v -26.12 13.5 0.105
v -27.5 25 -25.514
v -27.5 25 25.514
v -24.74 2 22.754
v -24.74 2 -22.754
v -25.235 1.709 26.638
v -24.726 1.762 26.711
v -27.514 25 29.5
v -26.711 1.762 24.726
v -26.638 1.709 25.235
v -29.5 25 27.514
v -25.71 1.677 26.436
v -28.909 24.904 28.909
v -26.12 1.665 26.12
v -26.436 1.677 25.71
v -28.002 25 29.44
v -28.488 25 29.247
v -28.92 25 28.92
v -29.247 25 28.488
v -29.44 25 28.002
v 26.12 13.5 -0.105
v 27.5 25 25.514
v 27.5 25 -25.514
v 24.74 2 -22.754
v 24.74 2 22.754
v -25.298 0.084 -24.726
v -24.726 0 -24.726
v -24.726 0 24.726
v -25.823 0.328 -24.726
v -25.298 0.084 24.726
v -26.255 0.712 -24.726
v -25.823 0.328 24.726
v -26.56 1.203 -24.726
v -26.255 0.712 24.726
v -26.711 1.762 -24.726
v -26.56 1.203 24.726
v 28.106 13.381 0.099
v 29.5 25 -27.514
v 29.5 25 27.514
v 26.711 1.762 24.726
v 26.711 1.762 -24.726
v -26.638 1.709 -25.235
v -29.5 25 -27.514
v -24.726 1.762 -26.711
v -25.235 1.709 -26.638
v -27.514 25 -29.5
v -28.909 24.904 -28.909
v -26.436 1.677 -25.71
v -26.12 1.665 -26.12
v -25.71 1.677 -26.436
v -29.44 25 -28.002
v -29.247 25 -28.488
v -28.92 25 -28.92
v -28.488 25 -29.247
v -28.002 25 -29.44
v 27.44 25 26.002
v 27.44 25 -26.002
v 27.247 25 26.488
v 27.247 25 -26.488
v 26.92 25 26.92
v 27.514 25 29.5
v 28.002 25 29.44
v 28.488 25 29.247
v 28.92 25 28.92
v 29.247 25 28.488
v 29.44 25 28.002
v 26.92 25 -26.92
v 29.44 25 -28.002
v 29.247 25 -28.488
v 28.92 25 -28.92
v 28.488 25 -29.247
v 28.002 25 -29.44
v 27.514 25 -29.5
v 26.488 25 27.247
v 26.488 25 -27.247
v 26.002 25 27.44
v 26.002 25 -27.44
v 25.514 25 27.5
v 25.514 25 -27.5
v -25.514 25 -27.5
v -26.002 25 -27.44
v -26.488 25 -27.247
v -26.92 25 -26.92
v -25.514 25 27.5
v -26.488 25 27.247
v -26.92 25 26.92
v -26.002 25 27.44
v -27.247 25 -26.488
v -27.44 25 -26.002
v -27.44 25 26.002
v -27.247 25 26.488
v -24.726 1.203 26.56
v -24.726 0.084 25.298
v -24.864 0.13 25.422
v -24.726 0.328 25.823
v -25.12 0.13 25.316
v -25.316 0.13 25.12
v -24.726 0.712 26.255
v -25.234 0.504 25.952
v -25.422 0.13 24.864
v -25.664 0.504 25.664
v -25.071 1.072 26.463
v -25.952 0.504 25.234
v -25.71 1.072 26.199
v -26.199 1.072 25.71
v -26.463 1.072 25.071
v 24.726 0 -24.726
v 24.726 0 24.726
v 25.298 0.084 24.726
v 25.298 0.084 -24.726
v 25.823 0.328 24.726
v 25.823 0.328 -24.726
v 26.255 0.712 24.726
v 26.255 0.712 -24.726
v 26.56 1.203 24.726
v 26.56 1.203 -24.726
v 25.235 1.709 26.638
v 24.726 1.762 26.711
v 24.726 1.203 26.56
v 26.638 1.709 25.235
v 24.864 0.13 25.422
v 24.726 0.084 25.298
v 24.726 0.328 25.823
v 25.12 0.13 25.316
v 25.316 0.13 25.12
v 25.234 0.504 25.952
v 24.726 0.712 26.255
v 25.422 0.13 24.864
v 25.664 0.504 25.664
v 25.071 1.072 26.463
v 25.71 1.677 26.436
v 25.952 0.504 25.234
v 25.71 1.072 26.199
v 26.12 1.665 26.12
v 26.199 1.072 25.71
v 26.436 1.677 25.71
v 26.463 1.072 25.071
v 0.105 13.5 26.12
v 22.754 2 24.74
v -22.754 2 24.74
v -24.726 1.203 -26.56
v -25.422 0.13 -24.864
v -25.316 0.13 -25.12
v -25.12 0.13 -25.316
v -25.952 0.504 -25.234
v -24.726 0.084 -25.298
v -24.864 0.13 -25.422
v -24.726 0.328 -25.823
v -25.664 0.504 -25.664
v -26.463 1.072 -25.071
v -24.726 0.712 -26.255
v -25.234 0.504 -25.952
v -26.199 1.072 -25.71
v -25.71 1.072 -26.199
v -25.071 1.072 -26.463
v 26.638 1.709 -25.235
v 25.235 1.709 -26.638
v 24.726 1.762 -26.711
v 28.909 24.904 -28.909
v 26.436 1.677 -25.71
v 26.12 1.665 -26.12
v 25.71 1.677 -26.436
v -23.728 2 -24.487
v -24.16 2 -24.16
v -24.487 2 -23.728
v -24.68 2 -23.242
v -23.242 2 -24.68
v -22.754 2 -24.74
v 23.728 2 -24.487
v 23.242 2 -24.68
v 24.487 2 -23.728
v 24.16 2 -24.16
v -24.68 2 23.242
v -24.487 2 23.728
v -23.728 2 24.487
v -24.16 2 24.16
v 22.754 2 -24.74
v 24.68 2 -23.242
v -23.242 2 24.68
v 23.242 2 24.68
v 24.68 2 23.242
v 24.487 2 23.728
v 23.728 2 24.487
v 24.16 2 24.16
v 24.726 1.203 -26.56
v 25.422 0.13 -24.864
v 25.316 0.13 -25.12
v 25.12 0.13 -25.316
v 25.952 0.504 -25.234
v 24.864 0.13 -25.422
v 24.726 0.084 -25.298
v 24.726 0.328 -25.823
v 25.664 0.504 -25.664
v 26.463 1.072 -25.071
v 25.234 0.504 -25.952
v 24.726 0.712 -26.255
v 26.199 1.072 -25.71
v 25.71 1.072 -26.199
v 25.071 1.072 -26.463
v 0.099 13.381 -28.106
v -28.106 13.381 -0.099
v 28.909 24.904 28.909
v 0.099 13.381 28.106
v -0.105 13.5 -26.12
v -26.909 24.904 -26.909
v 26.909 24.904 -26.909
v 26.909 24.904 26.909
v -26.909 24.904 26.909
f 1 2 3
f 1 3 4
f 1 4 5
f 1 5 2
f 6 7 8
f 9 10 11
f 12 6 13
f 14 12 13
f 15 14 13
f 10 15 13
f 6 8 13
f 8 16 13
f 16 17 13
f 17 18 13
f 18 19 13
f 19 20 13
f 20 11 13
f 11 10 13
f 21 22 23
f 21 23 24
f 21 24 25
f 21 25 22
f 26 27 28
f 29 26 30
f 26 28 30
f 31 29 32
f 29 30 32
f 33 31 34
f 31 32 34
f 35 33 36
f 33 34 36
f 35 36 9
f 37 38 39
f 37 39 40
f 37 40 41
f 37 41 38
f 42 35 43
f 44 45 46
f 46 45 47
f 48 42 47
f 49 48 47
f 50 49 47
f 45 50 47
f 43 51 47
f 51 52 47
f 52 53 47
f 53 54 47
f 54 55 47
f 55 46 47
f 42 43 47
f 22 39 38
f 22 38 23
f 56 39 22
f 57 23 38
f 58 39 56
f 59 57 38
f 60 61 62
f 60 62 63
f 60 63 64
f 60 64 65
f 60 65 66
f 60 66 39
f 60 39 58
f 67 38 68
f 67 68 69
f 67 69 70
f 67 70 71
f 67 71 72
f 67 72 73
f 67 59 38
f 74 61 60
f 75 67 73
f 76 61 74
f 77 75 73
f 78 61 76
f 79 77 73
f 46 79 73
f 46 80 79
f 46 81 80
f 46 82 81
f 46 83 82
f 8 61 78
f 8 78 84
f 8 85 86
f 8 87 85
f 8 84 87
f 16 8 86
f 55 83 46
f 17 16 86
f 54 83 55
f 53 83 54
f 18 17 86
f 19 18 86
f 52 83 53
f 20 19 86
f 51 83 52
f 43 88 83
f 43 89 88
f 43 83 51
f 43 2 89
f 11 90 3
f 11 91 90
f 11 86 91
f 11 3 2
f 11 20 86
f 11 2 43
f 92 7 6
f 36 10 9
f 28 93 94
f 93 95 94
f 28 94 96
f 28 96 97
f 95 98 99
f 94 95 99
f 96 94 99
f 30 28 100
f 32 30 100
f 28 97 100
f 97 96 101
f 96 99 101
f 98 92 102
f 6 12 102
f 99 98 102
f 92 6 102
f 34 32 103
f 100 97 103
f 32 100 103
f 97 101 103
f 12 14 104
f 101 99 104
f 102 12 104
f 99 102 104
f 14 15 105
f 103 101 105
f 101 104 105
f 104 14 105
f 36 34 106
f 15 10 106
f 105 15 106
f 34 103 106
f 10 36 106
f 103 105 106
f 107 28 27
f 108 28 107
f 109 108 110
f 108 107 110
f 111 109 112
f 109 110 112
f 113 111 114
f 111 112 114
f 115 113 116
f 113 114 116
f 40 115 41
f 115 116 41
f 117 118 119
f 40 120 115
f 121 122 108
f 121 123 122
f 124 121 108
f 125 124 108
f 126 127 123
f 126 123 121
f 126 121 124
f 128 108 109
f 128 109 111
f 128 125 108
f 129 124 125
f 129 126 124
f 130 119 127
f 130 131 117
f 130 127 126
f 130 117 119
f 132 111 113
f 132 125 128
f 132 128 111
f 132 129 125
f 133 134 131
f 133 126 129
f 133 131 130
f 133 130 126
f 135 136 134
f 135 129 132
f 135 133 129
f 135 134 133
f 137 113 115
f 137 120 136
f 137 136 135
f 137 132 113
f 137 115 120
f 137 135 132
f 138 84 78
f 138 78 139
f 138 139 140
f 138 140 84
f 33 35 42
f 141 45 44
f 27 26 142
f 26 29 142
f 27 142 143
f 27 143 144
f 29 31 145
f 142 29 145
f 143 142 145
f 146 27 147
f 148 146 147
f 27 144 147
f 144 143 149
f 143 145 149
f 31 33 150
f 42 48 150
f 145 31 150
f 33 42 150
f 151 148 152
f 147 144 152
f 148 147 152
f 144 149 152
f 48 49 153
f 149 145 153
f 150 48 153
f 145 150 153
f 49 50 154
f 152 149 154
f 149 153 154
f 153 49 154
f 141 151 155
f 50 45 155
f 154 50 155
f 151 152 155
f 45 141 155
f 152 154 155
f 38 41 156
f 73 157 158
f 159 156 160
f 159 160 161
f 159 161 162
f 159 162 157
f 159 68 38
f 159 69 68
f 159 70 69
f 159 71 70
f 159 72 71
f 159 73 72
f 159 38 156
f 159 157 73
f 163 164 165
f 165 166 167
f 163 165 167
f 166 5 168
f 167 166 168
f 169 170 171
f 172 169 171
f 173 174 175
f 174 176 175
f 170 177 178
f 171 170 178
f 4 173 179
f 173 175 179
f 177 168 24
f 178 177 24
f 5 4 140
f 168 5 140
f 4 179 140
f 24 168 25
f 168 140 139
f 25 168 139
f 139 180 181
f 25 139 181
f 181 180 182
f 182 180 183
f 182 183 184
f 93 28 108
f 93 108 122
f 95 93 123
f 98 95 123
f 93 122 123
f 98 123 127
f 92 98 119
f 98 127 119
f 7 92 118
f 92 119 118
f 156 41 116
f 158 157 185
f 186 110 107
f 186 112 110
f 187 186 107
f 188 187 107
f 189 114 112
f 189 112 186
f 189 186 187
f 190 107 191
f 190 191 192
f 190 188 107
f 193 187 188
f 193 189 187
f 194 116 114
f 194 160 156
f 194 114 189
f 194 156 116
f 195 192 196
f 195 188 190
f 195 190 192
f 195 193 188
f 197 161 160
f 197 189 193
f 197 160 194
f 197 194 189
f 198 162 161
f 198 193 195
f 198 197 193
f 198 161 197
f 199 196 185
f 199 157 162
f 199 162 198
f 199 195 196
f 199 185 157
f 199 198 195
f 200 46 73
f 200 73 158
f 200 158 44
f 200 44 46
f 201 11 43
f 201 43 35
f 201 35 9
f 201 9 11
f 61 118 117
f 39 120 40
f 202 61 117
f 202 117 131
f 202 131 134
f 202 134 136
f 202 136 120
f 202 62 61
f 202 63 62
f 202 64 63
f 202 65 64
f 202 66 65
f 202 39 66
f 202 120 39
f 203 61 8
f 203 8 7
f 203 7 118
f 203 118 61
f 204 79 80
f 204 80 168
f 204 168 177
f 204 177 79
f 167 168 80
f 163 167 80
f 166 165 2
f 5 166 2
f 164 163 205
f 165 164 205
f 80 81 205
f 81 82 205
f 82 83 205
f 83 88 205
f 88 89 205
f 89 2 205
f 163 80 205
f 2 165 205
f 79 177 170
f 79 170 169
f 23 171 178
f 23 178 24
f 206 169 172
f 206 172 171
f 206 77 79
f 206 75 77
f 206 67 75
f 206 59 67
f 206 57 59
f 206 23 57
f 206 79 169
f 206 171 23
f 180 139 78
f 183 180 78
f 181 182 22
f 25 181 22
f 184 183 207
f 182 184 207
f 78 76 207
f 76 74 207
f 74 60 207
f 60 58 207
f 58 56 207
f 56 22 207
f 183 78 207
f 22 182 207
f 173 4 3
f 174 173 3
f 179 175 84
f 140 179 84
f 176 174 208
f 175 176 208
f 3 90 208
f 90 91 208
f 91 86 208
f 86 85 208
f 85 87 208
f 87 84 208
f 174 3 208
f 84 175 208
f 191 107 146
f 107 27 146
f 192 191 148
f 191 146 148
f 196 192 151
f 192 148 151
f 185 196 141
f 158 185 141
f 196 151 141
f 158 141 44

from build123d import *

# Parameters (mm, degrees)
SKETCH4_W           = 53
SKETCH4_H           = 53
BOSS_EXTRUDE3_DEPTH = 2
FILLET1_R           = 2


with BuildPart() as part:
    # Sketch1 → Loft2 section 0
    with BuildSketch(Plane(origin=(0, 0, 0), x_dir=(1, 0, 0), z_dir=(0, 1, 0))):
        with BuildLine():
            Line((-26.5, -26.5), (26.5, -26.5))
            Line((26.5, -26.5), (26.5, 26.5))
            Line((26.5, 26.5), (-26.5, 26.5))
            Line((-26.5, 26.5), (-26.5, -26.5))
        make_face()
    # Sketch3 → Loft2 section 1
    with BuildSketch(Plane(origin=(0, 25, 0), x_dir=(1, 0, 0), z_dir=(0, 1, 0))):
        with BuildLine():
            Line((-29.5, 29.5), (29.5, 29.5))
            Line((29.5, 29.5), (29.5, -29.5))
            Line((29.5, -29.5), (-29.5, -29.5))
            Line((-29.5, -29.5), (-29.5, 29.5))
        make_face()
    loft()

    # Sketch1<198> → Cut-Loft1 section 0
    with BuildSketch(Plane(origin=(0, 0, 0), x_dir=(1, 0, 0), z_dir=(0, 1, 0))):
        with BuildLine():
            Line((-24.5, 24.5), (24.5, 24.5))
            Line((24.5, 24.5), (24.5, -24.5))
            Line((24.5, -24.5), (-24.5, -24.5))
            Line((-24.5, -24.5), (-24.5, 24.5))
        make_face()
    # Sketch3<140> → Cut-Loft1 section 1
    with BuildSketch(Plane(origin=(0, 25, 0), x_dir=(1, 0, 0), z_dir=(0, 1, 0))):
        with BuildLine():
            Line((-27.5, -27.5), (27.5, -27.5))
            Line((27.5, -27.5), (27.5, 27.5))
            Line((27.5, 27.5), (-27.5, 27.5))
            Line((-27.5, 27.5), (-27.5, -27.5))
        make_face()
    loft(mode=Mode.SUBTRACT)

    # Sketch4 → Boss-Extrude3 (add)
    with BuildSketch(Plane.XZ):
        Rectangle(SKETCH4_W, SKETCH4_H)
    extrude(amount=-BOSS_EXTRUDE3_DEPTH)

    # Fillet1
    fillet1_edges = [part.edges().sort_by_distance(p)[0] for p in [
        (-26.12, 13.5, 26.12),
        (-26.12, 13.5, -26.12),
        (26.12, 13.5, 26.12),
        (26.12, 13.5, -26.12),
        (28, 12.5, 28),
        (-28, 12.5, 28),
        (-28, 12.5, -28),
        (28, 12.5, -28),
        (0, 0, 26.5),
        (-26.5, 0, 0),
        (26.5, 0, 0),
        (0, 0, -26.5),
    ]]
    fillet(fillet1_edges, radius=FILLET1_R)


solid = part.part
